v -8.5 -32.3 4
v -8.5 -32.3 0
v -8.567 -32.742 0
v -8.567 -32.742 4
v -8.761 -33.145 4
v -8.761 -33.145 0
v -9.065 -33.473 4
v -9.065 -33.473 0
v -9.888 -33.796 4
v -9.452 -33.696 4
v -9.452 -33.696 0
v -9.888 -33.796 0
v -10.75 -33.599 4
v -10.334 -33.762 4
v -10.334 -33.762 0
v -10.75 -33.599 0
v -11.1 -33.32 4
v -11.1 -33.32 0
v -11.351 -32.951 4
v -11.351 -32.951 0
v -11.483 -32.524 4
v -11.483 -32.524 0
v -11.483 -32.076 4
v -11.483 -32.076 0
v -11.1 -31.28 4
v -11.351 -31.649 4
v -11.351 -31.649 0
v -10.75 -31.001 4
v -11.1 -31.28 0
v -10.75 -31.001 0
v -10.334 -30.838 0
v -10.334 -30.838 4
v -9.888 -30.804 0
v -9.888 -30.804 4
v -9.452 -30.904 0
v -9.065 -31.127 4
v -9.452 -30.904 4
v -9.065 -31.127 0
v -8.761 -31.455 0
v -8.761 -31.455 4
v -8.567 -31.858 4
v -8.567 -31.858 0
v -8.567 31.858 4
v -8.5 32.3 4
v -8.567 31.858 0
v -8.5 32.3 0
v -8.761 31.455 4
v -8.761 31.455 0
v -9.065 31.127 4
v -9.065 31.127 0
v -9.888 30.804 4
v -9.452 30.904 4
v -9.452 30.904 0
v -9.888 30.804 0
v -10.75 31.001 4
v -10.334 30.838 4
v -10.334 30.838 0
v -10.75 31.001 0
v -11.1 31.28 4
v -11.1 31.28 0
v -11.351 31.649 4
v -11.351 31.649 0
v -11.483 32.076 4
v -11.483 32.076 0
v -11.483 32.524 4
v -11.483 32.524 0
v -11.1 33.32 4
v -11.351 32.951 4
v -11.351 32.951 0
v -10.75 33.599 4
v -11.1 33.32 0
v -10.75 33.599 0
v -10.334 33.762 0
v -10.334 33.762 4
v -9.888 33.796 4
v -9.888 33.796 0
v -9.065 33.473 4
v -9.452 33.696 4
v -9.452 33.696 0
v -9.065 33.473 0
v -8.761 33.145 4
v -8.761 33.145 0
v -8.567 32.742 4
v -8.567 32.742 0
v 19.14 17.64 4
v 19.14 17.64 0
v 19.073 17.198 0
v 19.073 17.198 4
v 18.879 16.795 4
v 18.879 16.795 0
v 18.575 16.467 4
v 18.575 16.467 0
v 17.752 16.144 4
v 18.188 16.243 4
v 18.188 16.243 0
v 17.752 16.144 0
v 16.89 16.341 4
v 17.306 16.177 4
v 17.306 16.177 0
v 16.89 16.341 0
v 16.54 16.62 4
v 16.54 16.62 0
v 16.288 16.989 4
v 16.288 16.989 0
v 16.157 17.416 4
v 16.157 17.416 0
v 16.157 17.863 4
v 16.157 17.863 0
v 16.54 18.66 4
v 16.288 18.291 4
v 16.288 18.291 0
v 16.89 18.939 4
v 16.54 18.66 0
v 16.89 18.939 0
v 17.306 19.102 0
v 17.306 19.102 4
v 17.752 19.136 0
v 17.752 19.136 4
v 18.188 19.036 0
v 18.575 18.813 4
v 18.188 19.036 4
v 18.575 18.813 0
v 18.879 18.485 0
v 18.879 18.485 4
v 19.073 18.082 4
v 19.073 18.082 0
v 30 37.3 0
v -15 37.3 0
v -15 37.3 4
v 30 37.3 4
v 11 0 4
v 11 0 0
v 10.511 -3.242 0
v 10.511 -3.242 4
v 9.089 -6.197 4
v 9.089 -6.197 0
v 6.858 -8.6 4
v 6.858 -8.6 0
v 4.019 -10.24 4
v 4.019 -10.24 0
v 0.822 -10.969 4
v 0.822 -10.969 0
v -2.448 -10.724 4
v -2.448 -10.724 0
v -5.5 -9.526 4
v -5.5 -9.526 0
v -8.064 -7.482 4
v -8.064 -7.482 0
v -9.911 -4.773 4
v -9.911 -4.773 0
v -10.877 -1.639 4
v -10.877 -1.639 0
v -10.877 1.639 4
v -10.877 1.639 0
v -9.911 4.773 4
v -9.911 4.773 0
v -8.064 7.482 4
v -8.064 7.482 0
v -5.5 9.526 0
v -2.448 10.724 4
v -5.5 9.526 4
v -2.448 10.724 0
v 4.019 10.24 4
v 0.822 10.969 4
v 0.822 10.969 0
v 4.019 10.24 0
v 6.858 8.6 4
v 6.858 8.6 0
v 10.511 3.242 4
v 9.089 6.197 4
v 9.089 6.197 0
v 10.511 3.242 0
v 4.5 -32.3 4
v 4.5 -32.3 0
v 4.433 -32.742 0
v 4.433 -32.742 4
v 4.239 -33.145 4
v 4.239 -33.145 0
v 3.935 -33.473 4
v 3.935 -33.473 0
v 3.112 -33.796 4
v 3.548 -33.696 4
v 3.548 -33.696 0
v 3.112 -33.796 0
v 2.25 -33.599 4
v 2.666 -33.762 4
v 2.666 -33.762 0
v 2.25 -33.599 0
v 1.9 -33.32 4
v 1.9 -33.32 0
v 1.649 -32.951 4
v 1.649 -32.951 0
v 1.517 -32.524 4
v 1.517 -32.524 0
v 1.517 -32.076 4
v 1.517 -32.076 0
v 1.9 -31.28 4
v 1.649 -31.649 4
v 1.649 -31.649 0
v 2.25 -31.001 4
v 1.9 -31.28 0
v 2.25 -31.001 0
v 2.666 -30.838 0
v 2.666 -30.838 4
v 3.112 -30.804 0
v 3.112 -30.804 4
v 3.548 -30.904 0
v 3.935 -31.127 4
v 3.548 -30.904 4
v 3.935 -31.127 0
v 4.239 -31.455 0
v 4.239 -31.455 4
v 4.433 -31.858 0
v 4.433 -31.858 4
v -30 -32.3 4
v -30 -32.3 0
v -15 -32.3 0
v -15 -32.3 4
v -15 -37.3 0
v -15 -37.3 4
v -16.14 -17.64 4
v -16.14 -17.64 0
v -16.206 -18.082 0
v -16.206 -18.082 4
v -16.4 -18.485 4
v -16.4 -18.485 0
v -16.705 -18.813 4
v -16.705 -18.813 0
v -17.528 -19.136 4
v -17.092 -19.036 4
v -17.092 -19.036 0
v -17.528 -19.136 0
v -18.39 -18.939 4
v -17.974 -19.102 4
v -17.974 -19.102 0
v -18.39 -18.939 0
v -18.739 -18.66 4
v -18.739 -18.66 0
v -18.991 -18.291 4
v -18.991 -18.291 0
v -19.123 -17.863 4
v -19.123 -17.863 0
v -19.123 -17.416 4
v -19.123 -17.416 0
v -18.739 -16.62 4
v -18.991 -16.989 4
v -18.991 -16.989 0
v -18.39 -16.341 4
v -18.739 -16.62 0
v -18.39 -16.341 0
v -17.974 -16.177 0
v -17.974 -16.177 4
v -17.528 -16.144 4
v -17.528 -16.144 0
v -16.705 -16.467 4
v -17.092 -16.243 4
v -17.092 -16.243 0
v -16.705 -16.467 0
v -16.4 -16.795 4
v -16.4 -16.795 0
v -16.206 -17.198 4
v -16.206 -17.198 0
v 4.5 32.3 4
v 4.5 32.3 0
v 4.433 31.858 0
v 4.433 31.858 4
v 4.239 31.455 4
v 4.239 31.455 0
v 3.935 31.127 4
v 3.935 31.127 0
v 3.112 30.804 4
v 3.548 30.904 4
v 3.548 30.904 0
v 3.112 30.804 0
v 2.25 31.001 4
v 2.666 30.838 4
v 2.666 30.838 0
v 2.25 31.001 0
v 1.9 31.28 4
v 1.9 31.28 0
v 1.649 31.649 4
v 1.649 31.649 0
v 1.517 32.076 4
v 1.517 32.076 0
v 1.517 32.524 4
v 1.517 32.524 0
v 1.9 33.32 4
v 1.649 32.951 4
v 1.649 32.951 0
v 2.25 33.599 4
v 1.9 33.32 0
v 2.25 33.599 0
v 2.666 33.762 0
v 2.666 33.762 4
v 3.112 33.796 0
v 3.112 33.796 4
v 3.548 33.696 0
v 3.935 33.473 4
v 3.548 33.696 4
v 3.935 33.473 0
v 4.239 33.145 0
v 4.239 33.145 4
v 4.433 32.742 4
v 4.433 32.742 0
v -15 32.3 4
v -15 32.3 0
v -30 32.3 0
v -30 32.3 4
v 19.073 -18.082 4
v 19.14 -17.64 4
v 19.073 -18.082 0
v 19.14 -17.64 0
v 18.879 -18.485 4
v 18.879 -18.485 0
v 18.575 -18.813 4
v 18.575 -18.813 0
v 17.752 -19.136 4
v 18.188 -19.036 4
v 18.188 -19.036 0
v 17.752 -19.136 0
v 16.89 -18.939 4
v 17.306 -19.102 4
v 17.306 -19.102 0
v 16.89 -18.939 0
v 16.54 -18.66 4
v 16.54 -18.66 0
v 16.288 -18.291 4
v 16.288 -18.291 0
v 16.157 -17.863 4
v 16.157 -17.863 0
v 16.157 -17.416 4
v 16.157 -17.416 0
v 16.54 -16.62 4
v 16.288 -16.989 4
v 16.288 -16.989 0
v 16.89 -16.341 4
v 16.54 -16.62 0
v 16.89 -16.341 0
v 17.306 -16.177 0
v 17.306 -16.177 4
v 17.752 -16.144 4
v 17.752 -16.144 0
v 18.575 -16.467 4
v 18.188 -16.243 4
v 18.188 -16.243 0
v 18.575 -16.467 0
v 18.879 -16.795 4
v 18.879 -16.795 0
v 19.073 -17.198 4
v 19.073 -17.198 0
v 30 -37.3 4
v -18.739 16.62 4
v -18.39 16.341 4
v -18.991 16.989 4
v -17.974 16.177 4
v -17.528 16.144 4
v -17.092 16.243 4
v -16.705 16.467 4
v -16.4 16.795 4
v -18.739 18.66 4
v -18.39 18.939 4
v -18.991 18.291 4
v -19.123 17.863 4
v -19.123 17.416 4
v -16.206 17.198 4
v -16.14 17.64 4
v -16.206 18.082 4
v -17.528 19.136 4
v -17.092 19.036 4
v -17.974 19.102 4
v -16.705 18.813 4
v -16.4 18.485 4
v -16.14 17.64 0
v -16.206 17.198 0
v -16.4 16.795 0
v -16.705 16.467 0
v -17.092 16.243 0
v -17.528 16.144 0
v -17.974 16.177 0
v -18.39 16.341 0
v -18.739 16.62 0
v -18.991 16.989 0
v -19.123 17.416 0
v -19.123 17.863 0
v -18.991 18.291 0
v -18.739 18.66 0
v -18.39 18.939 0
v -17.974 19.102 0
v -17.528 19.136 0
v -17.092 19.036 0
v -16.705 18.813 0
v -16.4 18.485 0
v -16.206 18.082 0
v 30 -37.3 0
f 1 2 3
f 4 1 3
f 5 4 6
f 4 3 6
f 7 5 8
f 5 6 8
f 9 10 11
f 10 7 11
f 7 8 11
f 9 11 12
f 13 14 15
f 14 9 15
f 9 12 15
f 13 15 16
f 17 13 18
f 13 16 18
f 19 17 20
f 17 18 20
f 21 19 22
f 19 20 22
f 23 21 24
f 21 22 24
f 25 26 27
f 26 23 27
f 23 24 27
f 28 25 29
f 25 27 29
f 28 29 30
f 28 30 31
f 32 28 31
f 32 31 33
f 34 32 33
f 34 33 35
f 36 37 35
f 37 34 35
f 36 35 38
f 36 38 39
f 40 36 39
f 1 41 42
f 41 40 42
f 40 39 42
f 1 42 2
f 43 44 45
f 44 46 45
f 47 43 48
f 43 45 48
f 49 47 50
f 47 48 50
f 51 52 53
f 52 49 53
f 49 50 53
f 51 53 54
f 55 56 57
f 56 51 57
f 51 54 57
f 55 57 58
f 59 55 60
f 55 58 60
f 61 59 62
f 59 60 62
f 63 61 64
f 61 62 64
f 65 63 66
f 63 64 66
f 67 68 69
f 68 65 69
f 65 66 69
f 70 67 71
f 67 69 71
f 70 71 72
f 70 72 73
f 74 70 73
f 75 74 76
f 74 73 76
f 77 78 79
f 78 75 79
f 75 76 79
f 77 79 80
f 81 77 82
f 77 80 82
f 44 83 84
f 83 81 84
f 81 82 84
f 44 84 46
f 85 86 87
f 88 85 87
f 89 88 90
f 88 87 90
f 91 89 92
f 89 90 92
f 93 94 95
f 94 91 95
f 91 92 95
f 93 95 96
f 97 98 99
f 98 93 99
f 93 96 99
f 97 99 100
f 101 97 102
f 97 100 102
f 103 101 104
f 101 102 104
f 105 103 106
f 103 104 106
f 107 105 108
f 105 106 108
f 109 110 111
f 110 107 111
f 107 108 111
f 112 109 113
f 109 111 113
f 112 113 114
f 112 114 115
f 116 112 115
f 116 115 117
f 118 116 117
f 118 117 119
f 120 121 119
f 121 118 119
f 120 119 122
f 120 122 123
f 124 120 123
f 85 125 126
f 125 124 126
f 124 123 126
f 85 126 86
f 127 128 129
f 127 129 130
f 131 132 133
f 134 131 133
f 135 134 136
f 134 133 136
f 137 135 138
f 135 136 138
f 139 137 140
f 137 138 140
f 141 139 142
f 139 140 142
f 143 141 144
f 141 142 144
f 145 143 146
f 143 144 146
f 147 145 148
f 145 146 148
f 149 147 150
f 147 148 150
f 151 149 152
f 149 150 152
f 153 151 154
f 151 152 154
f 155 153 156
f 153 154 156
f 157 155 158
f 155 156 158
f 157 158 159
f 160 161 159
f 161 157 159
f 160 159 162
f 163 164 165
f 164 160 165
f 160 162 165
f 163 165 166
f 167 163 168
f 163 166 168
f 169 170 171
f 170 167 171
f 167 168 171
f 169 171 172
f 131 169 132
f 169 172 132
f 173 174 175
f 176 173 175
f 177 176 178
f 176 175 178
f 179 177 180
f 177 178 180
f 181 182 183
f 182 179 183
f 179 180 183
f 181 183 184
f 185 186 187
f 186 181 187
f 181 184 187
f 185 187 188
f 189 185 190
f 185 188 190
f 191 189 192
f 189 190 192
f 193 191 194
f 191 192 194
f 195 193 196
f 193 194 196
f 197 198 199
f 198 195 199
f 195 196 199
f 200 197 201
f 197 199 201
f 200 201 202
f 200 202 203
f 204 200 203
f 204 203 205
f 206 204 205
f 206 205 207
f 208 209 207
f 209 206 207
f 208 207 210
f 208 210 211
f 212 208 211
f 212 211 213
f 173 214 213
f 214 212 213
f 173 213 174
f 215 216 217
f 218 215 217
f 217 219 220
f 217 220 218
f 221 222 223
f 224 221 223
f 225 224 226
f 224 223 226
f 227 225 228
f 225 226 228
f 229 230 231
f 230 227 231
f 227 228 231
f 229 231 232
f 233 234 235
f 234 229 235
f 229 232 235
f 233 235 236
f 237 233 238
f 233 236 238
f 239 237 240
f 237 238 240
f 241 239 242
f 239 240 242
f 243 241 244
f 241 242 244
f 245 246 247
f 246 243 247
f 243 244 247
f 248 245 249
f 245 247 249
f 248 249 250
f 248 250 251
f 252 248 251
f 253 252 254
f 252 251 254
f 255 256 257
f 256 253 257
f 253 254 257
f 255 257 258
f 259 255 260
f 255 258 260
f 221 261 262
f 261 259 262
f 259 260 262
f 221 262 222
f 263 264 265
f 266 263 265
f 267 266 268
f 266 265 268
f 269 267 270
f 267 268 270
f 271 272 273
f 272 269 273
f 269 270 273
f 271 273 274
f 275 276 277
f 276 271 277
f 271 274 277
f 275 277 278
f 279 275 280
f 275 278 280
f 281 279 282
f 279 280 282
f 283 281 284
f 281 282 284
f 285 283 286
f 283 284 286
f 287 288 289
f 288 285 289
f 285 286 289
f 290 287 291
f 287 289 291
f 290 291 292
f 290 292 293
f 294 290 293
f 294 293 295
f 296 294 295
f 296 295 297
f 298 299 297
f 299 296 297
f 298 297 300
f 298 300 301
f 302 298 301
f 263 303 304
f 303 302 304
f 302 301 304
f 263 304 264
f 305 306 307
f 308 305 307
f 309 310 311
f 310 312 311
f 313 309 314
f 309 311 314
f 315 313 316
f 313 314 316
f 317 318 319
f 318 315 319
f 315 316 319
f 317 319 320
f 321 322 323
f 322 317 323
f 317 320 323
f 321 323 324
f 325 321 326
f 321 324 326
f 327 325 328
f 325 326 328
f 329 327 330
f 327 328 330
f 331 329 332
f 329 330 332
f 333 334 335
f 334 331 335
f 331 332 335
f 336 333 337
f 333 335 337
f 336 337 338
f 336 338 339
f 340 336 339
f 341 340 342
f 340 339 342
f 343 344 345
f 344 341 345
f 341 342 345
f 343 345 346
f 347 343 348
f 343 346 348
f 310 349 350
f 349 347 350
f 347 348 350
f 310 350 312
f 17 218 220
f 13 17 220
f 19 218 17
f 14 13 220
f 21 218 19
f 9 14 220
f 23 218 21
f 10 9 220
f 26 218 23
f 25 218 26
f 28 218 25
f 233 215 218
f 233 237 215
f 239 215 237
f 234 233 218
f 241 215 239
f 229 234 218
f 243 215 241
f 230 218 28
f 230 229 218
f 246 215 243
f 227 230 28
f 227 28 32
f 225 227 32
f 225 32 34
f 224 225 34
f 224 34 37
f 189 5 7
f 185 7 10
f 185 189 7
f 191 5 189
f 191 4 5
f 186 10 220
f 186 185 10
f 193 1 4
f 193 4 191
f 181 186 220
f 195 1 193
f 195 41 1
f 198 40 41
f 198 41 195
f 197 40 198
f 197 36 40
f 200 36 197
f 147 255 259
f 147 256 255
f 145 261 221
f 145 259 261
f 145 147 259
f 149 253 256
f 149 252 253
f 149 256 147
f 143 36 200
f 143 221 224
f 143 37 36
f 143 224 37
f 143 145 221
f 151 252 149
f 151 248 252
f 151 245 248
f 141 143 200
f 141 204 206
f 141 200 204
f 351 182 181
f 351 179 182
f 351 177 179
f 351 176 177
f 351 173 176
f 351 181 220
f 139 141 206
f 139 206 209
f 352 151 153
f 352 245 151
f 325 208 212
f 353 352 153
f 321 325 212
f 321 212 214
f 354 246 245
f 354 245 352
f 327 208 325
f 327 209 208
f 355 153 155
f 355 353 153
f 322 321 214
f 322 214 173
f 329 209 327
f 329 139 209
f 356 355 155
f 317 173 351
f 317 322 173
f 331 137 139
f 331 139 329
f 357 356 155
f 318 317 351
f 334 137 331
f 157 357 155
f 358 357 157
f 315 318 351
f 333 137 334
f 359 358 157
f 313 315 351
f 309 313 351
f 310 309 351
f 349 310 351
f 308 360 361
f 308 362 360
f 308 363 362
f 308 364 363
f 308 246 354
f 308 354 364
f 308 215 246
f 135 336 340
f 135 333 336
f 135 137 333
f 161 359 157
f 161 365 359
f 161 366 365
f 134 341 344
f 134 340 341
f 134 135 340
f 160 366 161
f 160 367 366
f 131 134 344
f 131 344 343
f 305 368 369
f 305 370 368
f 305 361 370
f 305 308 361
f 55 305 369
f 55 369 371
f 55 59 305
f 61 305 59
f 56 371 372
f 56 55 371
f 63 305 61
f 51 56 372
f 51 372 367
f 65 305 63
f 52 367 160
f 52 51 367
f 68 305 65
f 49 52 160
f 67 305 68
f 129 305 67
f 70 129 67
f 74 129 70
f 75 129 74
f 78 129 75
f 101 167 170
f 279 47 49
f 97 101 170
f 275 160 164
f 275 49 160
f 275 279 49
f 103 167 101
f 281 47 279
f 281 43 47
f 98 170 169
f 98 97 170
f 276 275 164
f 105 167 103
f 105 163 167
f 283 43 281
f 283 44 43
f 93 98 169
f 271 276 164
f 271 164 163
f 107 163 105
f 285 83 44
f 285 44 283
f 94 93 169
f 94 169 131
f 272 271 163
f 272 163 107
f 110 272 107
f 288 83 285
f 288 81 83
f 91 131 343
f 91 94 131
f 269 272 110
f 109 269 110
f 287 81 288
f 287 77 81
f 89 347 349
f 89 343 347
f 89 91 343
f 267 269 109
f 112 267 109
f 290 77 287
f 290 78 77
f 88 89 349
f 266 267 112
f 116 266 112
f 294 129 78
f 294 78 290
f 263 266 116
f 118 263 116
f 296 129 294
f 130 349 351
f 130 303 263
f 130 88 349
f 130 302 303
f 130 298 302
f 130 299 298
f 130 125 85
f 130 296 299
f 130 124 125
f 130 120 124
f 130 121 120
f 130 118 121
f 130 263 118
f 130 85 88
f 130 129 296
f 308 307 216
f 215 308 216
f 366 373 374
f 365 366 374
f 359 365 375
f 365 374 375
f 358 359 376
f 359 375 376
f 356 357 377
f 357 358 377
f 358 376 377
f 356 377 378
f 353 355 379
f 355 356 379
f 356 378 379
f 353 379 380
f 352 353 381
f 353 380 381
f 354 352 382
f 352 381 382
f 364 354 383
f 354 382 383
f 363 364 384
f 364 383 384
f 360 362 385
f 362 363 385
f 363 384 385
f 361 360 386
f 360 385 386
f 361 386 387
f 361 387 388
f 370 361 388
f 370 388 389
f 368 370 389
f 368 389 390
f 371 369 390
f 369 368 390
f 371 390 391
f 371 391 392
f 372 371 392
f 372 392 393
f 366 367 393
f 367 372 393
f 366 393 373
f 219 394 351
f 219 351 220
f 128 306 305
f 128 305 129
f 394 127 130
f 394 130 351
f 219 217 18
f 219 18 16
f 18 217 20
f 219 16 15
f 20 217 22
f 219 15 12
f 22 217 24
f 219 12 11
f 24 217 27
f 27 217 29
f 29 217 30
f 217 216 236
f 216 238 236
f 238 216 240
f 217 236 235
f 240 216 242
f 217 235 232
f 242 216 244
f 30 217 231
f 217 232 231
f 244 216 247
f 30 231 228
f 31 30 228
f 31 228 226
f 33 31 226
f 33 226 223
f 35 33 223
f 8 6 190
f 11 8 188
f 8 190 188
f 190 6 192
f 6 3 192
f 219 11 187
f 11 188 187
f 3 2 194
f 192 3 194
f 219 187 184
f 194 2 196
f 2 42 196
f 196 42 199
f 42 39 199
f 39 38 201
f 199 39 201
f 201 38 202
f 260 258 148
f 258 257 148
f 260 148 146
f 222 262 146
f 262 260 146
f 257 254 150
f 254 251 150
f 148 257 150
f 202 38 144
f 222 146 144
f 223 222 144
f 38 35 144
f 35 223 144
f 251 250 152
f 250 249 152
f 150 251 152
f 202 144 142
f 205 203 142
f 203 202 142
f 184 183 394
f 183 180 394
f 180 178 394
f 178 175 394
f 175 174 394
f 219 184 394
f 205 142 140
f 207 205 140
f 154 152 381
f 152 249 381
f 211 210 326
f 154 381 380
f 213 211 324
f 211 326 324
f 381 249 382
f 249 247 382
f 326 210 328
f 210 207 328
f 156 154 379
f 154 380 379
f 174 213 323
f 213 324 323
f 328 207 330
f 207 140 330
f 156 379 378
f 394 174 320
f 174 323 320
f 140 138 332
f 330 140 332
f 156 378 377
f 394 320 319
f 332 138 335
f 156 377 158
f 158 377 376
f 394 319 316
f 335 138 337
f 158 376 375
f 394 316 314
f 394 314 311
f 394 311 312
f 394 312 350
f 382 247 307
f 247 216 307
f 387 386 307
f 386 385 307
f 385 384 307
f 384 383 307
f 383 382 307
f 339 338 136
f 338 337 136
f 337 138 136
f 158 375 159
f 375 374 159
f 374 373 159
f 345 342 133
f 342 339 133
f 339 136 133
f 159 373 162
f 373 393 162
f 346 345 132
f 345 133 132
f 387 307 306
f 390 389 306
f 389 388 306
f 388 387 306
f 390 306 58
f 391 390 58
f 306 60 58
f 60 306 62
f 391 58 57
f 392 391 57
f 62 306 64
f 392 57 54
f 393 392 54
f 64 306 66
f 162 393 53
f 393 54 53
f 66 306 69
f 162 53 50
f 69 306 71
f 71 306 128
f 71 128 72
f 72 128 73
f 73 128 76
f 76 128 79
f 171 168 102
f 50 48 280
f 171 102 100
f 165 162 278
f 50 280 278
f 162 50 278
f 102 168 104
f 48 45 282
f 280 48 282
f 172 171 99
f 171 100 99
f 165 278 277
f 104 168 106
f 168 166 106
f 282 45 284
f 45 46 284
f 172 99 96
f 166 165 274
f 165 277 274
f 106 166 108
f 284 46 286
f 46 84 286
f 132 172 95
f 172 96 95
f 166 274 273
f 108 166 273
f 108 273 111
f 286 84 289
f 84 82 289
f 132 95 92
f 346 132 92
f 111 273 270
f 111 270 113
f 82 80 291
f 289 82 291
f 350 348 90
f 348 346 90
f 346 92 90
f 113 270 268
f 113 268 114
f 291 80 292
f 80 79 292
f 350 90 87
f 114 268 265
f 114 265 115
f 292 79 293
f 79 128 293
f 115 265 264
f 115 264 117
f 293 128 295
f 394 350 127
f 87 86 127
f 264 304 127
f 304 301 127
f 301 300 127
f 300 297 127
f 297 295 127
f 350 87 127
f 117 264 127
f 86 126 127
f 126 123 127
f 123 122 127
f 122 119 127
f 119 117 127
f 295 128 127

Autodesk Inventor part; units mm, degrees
ref_plane "YZ Plane" through (0, 0, 0) normal (1, 0, 0) x (0, 1, 0)
ref_plane "XZ Plane" through (0, 0, 0) normal (0, 1, 0) x (-1, 0, 0)
ref_plane "XY Plane" through (0, 0, 0) normal (0, 0, 1) x (1, 0, 0)
sketch "Sketch1" plane through (0, 0, 0) normal (0, 0, 1) x (1, 0, 0)
  circle A0 centre (0, 0) radius 11
  line L0 (-15, 37.3) -> (30, 37.3)
  line L1 (30, 37.3) -> (30, -37.3)
  line L2 (30, -37.3) -> (-15, -37.3)
  line L3 (-15, -37.3) -> (-15, 37.3)
  line L4 (-15, 32.3) -> (-30, 32.3)
  line L5 (-30, 32.3) -> (-30, -32.3)
  line L6 (-30, -32.3) -> (-15, -32.3)
  line L7 (-15, -32.3) -> (-15, 32.3)
  circle A1 centre (-10, 32.3) radius 1.5
  circle A2 centre (3, 32.3) radius 1.5
  circle A3 centre (-10, -32.3) radius 1.5
  circle A4 centre (3, -32.3) radius 1.5
  circle A5 centre (-17.6398, 17.6398) radius 1.5
  line L8 (0, 0) -> (-17.6398, 17.6398) construction
  line L9 (0, 0) -> (-30, 0) construction
  circle A6 centre (-17.6398, -17.6398) radius 1.5
  circle A7 centre (17.6398, -17.6398) radius 1.5
  circle A8 centre (17.6398, 17.6398) radius 1.5
  point P0 (-15, -32.3)
  dimension "d0" = 22
  dimension "d1" = 3
  dimension "d2" = 3
  dimension "d3" = 3
  dimension "d4" = 3
  dimension "d5" = 5
  dimension "d6" = 5
  dimension "d7" = 5
  dimension "d8" = 13
  dimension "d9" = 13
  dimension "d10" = 5
  dimension "d11" = 5
  dimension "d12" = 5
  dimension "d13" = 74.6
  dimension "d14" = 37.3
  dimension "d15" = 60
  dimension "d16" = 15
  dimension "d17" = 5
  dimension "d18" = 5
  dimension "d19" = 30
  dimension "d20" = 3
  dimension "d22" = 45
  dimension "d25" = 360
extrude "Extrusion1" add sketch "Sketch1" along normal blind 4
equation "\"d7\" = d6"
equation "\"d9\" = d8"
equation "\"d11\" = d10"
equation "\"d12\" = d10"
equation "\"d14\" = 0.5 * d13"
equation "\"d18\" = d17"
equation "\"d19\" = 0.5 * d15"
properties part number "MotorHolder"
